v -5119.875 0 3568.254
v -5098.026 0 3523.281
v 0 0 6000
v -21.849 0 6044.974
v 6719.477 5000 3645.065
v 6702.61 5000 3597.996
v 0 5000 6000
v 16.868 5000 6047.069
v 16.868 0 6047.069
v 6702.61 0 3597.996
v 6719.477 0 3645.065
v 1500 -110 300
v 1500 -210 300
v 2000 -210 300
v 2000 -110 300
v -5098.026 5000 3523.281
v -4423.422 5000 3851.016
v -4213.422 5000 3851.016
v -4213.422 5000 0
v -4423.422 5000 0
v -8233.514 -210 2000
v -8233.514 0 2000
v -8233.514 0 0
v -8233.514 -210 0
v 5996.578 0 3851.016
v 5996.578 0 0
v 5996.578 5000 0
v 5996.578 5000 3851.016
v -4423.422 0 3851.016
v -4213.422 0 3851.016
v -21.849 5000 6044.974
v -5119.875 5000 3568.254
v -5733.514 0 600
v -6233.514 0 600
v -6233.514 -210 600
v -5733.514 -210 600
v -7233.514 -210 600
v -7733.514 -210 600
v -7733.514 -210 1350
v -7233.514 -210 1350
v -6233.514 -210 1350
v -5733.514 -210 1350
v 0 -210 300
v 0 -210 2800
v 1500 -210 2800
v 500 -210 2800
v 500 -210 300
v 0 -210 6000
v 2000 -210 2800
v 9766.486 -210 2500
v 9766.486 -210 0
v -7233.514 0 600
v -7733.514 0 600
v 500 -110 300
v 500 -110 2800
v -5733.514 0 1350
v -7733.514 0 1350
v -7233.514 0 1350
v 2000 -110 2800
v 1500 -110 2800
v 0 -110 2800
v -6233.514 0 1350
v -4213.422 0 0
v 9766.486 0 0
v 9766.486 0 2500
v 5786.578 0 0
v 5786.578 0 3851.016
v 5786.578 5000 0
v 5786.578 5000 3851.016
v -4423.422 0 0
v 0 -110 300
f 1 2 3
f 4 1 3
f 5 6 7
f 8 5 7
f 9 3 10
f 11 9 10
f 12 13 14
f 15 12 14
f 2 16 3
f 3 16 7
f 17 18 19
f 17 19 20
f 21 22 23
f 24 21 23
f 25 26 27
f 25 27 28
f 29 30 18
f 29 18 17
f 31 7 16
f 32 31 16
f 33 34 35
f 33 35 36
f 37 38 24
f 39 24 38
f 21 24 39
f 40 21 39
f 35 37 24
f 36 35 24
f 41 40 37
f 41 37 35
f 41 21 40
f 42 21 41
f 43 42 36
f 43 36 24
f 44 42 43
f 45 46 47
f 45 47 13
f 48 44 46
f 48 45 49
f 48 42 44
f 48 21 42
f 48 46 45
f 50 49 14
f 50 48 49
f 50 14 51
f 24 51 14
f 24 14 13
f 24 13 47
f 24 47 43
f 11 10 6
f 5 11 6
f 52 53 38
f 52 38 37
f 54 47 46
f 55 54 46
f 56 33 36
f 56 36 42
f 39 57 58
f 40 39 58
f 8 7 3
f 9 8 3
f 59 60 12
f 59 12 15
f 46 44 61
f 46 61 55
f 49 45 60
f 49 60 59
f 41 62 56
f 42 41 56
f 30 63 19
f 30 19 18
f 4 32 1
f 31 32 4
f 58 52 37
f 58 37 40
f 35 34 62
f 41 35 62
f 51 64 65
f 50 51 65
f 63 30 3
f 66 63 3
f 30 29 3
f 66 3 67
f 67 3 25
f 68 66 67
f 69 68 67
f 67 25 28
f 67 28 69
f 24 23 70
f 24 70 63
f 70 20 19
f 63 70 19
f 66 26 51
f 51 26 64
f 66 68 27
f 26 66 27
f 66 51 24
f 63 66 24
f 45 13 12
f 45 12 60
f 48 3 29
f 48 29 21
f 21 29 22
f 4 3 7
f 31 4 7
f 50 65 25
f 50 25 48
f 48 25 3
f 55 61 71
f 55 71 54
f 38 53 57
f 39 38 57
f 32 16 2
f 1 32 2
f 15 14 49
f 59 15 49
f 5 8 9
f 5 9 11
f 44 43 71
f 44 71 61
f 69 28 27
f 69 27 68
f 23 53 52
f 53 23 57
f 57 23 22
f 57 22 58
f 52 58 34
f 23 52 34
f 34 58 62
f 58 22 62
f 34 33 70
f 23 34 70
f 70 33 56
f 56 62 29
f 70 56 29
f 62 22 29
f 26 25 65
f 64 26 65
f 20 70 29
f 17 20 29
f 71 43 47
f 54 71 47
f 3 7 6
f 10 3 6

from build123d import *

# Parameters (mm, degrees)
F0_W     = 500
F0_H     = 750
F1_DEPTH = 210
F2_W     = 500
F2_H     = 2500
F3_DEPTH = 100
F4_W     = 210
F4_H     = 3851.0160439499
F5_DEPTH = 5000
F7_DEPTH = 50
F9_DEPTH = 50


with BuildPart() as f1:
    # F0 (on Front) → F1 (new body)
    with BuildSketch(Plane.XZ):
        Polygon((-8233.5140852987, 0), (0, 0), (9766.4859147013, 0), (9766.4859147013, 2500), (0, 6000), (-5203.5374641418, 3472.0211029053), (-8233.5140852987, 2000), align=None)
        with Locations((-7483.5140852987, 975)):
            Rectangle(F0_W, F0_H, mode=Mode.SUBTRACT)
        with Locations((-5983.5140852987, 975)):
            Rectangle(F0_W, F0_H, mode=Mode.SUBTRACT)
    extrude(amount=F1_DEPTH)

    # F2 (on face) → F3 (cut)
    with BuildSketch(Plane.XZ.offset(210)):
        with Locations((250, 1550)):
            Rectangle(F2_W, F2_H)
        with Locations((1750, 1550)):
            Rectangle(F2_W, F2_H)
    extrude(amount=-F3_DEPTH, mode=Mode.SUBTRACT)

    # F4 (on face) → F5 (join)
    with BuildSketch(Plane(origin=(0, 0, 0), x_dir=(-1, 0, 0), z_dir=(0, 1, 0))):
        with Locations((4318.4224178049, 1925.5080219749)):
            Rectangle(F4_W, F4_H)
        with Locations((-5891.5775821951, 1925.5080219749)):
            Rectangle(F4_W, F4_H)
    extrude(amount=F5_DEPTH)


with BuildPart() as f7:
    # F6 (on face) → F7 (new body)
    with BuildSketch(Plane(origin=(-2358.3071897462, 0, 4854.2888660592), x_dir=(0.8994710359, 0, 0.4369803836), z_dir=(-0.4369803836, 0, 0.8994710359))):
        Polygon((-2295.9218760104, 0), (2621.8823016384, 0), (2621.8823016384, 5000), (-3045.9218760104, 5000), (-3045.9218760104, 0), align=None)
    extrude(amount=F7_DEPTH)


with BuildPart() as f9:
    # F8 (on face) → F9 (new body)
    with BuildSketch(Plane(origin=(1905.4920686735, 0, 5317.1318426499), x_dir=(0.9413759294, 0, -0.3373593923), z_dir=(0.3373593923, 0, 0.9413759294))):
        Polygon((-2024.1563536694, 5000), (-2024.1563536694, 0), (4345.857362379, 0), (5095.857362379, 0), (5095.857362379, 5000), align=None)
    extrude(amount=F9_DEPTH)


solid = Compound([f1.part, f7.part, f9.part])
